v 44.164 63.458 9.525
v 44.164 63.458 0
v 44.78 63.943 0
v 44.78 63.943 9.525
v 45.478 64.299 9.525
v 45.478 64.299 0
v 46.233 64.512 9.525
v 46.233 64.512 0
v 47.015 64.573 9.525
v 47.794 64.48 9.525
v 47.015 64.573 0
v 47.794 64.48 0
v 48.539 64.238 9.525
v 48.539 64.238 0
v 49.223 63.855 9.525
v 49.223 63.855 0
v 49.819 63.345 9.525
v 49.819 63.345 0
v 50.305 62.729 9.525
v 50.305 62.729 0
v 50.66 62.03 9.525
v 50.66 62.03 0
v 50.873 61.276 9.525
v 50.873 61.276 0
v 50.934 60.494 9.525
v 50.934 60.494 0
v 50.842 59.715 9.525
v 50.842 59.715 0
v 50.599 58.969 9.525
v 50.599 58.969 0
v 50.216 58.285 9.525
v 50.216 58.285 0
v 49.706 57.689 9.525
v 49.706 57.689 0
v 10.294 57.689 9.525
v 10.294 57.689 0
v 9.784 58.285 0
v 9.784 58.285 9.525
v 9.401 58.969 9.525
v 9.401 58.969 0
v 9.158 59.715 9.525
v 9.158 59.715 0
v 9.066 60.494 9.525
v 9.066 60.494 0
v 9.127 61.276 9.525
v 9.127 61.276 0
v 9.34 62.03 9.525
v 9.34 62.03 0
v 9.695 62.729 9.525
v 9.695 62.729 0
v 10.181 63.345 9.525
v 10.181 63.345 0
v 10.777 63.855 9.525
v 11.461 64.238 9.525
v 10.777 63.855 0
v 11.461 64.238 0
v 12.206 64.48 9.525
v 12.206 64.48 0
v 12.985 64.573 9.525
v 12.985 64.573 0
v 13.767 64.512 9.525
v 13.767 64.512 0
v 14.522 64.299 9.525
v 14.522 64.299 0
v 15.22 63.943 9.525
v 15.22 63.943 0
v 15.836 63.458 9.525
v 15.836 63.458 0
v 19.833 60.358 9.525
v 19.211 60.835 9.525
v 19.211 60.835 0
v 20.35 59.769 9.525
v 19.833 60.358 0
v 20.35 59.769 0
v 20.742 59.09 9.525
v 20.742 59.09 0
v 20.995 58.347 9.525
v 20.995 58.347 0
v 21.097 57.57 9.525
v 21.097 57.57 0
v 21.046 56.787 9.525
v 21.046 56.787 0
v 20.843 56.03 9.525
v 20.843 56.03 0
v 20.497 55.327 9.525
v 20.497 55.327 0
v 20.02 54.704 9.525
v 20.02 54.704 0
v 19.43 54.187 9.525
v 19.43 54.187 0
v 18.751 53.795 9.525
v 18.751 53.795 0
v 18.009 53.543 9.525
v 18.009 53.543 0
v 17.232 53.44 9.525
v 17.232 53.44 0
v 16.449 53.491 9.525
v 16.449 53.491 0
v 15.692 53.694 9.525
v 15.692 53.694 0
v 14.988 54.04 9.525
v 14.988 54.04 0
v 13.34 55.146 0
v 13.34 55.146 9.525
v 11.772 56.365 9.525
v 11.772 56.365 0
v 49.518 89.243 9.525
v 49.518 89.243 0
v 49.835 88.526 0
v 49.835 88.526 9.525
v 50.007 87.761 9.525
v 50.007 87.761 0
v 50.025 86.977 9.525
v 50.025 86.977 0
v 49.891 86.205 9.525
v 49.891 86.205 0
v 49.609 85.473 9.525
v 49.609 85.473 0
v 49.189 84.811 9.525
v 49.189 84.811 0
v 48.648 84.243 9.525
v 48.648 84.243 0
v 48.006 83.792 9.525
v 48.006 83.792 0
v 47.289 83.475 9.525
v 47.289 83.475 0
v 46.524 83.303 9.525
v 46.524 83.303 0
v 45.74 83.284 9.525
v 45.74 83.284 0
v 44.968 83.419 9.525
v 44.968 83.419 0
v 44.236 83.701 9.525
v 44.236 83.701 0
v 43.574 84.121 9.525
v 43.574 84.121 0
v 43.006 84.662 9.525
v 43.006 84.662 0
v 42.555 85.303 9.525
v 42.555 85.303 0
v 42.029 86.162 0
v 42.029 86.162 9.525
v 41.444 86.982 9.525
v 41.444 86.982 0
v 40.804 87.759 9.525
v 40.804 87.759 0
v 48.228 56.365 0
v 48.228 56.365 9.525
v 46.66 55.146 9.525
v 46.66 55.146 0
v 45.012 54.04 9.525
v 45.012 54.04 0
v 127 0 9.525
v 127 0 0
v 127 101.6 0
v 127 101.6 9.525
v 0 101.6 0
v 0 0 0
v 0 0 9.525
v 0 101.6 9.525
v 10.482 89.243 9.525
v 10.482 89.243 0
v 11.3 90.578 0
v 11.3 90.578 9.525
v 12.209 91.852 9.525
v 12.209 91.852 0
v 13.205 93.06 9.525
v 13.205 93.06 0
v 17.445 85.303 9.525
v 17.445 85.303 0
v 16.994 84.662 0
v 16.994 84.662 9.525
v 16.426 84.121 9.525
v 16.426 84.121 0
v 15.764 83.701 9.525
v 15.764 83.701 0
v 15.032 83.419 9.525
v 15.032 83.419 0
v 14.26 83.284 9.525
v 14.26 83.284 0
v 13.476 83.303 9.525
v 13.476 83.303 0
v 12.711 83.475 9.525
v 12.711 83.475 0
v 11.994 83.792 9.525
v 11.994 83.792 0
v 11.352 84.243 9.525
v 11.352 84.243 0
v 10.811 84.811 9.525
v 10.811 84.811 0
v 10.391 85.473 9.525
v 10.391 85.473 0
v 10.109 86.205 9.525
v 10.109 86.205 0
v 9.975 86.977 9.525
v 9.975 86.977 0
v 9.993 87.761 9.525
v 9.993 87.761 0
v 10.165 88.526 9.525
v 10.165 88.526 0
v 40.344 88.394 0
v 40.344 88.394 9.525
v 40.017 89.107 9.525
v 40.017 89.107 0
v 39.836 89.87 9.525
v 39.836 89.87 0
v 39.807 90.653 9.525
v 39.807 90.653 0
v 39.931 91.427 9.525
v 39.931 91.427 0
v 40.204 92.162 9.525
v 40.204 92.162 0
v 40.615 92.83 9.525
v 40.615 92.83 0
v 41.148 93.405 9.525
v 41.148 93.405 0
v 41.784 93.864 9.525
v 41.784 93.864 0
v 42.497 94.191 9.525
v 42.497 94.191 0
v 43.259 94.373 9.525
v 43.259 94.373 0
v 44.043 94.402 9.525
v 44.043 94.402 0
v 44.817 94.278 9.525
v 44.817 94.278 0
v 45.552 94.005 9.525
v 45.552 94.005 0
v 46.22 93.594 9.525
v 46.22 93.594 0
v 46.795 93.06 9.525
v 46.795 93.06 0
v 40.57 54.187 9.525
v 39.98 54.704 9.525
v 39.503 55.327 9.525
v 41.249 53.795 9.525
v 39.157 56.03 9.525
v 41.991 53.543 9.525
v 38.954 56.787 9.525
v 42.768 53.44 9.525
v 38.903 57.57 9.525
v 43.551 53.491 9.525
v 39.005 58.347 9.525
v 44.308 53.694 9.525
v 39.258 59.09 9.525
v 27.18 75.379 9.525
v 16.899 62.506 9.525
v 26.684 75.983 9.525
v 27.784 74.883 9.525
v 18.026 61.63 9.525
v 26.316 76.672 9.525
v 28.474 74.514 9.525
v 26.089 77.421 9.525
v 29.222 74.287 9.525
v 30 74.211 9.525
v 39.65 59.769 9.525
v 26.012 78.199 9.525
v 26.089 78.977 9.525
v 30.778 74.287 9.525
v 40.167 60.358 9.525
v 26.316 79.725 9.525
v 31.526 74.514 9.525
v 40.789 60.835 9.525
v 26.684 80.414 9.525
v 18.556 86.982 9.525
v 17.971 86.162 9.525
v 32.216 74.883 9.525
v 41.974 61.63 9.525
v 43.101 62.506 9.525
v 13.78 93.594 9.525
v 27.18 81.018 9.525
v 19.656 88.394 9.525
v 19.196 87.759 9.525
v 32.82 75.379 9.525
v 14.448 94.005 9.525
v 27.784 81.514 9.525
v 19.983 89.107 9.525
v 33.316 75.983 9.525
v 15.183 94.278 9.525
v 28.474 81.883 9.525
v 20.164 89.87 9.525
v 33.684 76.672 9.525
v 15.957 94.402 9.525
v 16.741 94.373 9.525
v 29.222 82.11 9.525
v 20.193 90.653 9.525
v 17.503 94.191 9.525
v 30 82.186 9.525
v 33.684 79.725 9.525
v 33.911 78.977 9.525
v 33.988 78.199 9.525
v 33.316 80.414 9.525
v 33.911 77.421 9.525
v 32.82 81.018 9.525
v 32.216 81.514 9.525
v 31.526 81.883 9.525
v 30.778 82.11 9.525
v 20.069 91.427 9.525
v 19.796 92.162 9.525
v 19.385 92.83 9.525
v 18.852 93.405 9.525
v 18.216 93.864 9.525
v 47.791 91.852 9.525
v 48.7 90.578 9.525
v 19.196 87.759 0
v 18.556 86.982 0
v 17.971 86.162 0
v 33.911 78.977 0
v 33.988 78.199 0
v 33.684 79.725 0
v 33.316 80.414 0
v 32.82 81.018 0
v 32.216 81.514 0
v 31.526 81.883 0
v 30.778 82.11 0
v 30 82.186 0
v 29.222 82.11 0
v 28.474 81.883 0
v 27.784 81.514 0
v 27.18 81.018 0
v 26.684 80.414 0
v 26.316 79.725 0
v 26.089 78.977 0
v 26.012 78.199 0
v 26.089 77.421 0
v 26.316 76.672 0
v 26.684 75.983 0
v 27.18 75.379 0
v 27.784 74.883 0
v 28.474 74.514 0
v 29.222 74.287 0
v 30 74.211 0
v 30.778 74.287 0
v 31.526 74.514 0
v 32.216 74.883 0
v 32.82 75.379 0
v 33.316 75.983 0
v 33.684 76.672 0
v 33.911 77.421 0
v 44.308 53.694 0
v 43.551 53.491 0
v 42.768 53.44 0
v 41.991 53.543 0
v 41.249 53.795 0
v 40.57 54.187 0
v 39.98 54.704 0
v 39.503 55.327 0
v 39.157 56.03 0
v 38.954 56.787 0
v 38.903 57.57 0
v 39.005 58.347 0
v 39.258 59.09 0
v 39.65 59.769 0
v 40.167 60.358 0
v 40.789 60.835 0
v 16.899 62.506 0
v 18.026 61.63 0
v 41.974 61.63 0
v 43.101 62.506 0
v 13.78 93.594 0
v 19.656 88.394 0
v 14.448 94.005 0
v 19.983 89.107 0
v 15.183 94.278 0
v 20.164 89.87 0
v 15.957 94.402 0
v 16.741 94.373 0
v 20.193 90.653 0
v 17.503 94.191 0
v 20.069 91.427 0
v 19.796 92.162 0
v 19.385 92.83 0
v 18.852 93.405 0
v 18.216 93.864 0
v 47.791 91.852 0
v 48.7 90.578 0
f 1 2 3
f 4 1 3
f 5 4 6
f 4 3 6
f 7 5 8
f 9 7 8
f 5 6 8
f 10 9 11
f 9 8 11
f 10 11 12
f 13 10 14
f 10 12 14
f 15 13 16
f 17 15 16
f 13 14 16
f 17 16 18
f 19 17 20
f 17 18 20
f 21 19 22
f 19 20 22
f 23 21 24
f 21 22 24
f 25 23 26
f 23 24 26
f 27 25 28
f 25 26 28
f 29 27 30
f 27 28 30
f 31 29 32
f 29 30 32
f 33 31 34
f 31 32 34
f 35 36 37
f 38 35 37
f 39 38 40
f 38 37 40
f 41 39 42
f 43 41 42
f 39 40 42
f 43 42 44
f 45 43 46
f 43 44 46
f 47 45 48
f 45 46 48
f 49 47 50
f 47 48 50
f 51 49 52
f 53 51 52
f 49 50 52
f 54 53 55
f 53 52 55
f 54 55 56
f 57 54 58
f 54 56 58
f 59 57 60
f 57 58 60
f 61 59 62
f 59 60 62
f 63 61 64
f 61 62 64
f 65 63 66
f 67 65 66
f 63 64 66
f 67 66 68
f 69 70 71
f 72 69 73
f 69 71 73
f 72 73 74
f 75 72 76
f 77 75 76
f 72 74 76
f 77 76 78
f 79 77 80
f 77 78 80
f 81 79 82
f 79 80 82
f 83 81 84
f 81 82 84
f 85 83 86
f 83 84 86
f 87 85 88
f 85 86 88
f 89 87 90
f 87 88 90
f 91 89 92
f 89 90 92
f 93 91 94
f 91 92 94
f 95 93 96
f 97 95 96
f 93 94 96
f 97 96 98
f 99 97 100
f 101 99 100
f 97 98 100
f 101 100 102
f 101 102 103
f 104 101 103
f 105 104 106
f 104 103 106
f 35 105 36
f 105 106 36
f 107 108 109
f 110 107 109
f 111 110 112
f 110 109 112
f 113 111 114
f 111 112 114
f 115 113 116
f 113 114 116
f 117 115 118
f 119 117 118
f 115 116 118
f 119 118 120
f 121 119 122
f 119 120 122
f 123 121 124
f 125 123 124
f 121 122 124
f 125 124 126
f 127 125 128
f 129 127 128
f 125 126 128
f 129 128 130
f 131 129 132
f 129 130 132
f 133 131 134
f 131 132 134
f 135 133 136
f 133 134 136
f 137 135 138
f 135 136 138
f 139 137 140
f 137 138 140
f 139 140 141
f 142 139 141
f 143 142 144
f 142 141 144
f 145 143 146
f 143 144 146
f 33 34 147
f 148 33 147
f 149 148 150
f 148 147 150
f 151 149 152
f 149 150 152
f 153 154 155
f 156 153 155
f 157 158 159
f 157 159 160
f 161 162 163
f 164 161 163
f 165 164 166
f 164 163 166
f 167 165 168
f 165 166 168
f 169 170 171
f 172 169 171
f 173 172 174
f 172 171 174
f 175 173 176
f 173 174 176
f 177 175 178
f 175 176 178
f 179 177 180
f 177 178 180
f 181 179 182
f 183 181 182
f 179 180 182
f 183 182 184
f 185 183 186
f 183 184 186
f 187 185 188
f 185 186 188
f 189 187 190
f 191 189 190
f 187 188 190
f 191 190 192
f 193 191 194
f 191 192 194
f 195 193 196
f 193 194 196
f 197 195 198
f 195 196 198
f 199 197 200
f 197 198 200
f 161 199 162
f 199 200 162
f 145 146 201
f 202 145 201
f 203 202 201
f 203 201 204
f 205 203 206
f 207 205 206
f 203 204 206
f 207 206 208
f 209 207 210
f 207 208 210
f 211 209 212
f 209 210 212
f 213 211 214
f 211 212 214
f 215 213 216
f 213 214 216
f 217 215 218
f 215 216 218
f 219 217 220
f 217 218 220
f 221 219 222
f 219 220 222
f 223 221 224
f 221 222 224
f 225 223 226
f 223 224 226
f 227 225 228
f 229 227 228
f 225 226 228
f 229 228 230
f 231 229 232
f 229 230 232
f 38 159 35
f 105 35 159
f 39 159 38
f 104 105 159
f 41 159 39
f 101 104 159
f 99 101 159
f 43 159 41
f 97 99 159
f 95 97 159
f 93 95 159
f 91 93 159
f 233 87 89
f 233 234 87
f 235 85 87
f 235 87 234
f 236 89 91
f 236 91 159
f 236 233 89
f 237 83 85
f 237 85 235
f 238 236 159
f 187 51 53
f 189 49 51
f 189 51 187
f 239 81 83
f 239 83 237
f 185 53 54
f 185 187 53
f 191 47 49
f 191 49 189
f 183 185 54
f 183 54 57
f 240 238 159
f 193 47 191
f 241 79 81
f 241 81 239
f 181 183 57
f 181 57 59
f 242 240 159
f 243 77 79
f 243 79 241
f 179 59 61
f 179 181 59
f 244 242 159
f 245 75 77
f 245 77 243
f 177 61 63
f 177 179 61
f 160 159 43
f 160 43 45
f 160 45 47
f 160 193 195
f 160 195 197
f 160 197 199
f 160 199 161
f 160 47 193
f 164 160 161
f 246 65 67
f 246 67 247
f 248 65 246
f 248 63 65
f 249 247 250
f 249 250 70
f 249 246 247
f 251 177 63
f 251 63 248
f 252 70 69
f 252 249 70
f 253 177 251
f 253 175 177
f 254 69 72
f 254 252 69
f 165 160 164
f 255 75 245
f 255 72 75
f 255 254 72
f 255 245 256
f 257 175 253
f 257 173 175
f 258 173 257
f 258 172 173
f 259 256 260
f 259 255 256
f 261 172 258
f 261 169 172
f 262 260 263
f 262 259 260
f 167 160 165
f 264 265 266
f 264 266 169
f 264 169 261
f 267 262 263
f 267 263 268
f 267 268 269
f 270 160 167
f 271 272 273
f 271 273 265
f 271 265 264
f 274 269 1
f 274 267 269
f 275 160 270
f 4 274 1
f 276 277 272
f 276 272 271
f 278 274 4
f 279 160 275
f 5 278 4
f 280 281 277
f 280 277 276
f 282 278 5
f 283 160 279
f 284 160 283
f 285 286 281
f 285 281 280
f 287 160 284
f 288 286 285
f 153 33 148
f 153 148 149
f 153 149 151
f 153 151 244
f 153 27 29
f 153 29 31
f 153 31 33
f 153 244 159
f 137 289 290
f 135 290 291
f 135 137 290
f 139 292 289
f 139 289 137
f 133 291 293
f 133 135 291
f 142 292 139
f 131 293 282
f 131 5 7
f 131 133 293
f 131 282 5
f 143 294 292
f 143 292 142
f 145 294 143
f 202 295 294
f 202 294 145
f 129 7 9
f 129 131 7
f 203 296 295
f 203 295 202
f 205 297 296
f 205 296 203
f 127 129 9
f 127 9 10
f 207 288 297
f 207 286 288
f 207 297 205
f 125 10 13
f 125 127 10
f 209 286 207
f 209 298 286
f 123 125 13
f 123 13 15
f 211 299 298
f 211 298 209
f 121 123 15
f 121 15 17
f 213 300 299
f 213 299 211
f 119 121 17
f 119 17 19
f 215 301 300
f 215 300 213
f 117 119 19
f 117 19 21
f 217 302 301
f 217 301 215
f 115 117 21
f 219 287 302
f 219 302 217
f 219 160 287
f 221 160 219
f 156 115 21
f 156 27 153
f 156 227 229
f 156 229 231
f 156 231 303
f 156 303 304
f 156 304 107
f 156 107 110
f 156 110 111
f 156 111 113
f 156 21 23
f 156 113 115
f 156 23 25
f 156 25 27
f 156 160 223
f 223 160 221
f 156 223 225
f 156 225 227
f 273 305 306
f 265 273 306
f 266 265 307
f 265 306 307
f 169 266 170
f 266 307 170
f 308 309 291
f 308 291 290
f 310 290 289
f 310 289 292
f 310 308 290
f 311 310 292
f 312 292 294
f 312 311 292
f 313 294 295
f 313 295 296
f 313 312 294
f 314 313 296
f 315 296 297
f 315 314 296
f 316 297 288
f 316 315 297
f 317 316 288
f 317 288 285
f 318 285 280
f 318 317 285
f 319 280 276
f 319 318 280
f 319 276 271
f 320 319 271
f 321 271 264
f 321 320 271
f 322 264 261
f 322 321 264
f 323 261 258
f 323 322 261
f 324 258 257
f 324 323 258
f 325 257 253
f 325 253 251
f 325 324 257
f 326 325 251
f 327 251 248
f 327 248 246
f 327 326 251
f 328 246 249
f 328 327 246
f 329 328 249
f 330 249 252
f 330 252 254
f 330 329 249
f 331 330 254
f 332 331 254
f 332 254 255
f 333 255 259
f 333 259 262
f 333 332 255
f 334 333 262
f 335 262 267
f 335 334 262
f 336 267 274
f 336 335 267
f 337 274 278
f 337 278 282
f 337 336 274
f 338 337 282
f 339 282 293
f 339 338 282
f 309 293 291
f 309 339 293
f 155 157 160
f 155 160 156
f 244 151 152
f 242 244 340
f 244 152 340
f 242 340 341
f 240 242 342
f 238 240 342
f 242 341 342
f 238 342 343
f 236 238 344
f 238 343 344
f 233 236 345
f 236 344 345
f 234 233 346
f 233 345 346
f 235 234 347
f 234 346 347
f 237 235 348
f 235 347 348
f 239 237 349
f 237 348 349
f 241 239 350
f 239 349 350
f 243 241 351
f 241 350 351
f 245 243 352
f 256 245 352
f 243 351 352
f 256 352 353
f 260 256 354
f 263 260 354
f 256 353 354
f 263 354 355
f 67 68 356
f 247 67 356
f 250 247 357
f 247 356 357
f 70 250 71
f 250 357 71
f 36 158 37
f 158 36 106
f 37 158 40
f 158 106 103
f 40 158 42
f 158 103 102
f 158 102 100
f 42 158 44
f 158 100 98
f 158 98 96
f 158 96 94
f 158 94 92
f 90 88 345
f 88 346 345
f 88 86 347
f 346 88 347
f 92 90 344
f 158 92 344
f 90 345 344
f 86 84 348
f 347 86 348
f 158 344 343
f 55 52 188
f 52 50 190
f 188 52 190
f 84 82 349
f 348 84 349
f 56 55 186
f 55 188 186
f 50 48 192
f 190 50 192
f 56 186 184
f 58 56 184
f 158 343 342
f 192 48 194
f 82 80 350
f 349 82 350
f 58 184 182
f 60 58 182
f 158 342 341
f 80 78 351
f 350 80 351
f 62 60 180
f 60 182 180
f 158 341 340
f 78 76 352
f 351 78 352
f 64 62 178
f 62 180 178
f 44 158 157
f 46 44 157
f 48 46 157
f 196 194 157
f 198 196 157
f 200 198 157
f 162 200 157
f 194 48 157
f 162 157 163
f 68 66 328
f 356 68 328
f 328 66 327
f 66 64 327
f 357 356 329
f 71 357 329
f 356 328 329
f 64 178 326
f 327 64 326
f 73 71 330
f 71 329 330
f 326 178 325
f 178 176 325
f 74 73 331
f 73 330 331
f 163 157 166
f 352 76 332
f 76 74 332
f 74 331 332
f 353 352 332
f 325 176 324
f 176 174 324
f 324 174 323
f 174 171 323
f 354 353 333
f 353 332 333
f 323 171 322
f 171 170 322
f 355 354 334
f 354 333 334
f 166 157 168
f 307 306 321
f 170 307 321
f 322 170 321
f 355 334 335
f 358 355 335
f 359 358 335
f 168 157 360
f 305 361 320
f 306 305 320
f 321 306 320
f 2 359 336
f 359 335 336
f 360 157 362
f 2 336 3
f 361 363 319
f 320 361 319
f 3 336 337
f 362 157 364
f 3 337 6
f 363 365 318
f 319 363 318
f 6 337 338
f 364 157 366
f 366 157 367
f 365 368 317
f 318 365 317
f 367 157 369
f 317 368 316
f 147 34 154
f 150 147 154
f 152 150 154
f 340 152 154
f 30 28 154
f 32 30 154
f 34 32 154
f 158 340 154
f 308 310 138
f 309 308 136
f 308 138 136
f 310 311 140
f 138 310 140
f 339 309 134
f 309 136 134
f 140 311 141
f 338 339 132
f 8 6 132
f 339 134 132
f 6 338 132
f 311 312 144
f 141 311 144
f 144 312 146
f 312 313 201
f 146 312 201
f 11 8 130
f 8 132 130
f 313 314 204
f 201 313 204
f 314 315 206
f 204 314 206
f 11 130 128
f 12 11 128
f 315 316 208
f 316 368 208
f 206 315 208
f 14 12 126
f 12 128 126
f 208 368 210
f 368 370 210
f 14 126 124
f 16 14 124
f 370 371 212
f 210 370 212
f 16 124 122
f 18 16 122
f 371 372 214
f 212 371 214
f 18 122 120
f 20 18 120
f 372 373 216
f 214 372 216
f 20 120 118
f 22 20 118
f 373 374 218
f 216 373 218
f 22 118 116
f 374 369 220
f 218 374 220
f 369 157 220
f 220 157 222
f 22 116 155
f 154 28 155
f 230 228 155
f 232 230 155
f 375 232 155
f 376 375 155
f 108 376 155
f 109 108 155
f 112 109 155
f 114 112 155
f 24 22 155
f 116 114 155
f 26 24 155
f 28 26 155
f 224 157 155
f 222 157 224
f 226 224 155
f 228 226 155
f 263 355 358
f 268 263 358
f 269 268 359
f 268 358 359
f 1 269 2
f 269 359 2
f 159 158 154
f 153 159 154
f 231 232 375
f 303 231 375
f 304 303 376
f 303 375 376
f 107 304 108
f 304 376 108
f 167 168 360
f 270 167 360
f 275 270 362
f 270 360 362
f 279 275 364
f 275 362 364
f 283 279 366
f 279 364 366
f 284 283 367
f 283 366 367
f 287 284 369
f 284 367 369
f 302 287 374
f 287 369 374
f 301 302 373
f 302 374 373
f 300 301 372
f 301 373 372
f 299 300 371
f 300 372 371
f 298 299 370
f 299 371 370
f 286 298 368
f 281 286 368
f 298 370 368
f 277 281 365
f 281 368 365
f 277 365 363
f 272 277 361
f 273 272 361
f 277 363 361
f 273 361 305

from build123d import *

# Parameters (mm, degrees)
F0_W     = 127
F0_H     = 101.6
F0_R     = 3.9878
F1_DEPTH = 9.525


with BuildPart() as f1:
    # F0 (on Top) → F1 (new body)
    with BuildSketch(Plane.XY):
        with Locations((63.5, 50.8)):
            Rectangle(F0_W, F0_H)
        with BuildLine():
            ThreePointArc((14.988244, 54.040302), (12.545255, 55.7418), (10.293505, 57.689338))
            ThreePointArc((10.293505, 57.689338), (10.180615, 63.345065), (15.836343, 63.457955))
            ThreePointArc((15.836343, 63.457955), (17.454745, 62.0582), (19.210594, 60.835283))
            ThreePointArc((19.210594, 60.835283), (20.496909, 55.326617), (14.988244, 54.040302))
        make_face(mode=Mode.SUBTRACT)
        with BuildLine():
            ThreePointArc((45.011756, 54.040302), (39.503091, 55.326617), (40.789406, 60.835283))
            ThreePointArc((40.789406, 60.835283), (42.545255, 62.0582), (44.163657, 63.457955))
            ThreePointArc((44.163657, 63.457955), (49.819385, 63.345065), (49.706495, 57.689338))
            ThreePointArc((49.706495, 57.689338), (47.454745, 55.7418), (45.011756, 54.040302))
        make_face(mode=Mode.SUBTRACT)
        with BuildLine():
            ThreePointArc((10.482321, 89.24346), (11.743749, 91.223108), (13.205196, 93.060056))
            ThreePointArc((13.205196, 93.060056), (18.85153, 93.404885), (19.19636, 87.758551))
            ThreePointArc((19.19636, 87.758551), (18.256251, 86.576892), (17.444809, 85.303439))
            ThreePointArc((17.444809, 85.303439), (11.993555, 83.792206), (10.482321, 89.24346))
        make_face(mode=Mode.SUBTRACT)
        with Locations((30, 78.198548)):
            Circle(F0_R, mode=Mode.SUBTRACT)
        with BuildLine():
            ThreePointArc((40.80364, 87.758551), (41.14847, 93.404885), (46.794804, 93.060056))
            ThreePointArc((46.794804, 93.060056), (48.256251, 91.223108), (49.517679, 89.24346))
            ThreePointArc((49.517679, 89.24346), (48.006445, 83.792206), (42.555191, 85.303439))
            ThreePointArc((42.555191, 85.303439), (41.743749, 86.576892), (40.80364, 87.758551))
        make_face(mode=Mode.SUBTRACT)
    extrude(amount=F1_DEPTH)


solid = f1.part
